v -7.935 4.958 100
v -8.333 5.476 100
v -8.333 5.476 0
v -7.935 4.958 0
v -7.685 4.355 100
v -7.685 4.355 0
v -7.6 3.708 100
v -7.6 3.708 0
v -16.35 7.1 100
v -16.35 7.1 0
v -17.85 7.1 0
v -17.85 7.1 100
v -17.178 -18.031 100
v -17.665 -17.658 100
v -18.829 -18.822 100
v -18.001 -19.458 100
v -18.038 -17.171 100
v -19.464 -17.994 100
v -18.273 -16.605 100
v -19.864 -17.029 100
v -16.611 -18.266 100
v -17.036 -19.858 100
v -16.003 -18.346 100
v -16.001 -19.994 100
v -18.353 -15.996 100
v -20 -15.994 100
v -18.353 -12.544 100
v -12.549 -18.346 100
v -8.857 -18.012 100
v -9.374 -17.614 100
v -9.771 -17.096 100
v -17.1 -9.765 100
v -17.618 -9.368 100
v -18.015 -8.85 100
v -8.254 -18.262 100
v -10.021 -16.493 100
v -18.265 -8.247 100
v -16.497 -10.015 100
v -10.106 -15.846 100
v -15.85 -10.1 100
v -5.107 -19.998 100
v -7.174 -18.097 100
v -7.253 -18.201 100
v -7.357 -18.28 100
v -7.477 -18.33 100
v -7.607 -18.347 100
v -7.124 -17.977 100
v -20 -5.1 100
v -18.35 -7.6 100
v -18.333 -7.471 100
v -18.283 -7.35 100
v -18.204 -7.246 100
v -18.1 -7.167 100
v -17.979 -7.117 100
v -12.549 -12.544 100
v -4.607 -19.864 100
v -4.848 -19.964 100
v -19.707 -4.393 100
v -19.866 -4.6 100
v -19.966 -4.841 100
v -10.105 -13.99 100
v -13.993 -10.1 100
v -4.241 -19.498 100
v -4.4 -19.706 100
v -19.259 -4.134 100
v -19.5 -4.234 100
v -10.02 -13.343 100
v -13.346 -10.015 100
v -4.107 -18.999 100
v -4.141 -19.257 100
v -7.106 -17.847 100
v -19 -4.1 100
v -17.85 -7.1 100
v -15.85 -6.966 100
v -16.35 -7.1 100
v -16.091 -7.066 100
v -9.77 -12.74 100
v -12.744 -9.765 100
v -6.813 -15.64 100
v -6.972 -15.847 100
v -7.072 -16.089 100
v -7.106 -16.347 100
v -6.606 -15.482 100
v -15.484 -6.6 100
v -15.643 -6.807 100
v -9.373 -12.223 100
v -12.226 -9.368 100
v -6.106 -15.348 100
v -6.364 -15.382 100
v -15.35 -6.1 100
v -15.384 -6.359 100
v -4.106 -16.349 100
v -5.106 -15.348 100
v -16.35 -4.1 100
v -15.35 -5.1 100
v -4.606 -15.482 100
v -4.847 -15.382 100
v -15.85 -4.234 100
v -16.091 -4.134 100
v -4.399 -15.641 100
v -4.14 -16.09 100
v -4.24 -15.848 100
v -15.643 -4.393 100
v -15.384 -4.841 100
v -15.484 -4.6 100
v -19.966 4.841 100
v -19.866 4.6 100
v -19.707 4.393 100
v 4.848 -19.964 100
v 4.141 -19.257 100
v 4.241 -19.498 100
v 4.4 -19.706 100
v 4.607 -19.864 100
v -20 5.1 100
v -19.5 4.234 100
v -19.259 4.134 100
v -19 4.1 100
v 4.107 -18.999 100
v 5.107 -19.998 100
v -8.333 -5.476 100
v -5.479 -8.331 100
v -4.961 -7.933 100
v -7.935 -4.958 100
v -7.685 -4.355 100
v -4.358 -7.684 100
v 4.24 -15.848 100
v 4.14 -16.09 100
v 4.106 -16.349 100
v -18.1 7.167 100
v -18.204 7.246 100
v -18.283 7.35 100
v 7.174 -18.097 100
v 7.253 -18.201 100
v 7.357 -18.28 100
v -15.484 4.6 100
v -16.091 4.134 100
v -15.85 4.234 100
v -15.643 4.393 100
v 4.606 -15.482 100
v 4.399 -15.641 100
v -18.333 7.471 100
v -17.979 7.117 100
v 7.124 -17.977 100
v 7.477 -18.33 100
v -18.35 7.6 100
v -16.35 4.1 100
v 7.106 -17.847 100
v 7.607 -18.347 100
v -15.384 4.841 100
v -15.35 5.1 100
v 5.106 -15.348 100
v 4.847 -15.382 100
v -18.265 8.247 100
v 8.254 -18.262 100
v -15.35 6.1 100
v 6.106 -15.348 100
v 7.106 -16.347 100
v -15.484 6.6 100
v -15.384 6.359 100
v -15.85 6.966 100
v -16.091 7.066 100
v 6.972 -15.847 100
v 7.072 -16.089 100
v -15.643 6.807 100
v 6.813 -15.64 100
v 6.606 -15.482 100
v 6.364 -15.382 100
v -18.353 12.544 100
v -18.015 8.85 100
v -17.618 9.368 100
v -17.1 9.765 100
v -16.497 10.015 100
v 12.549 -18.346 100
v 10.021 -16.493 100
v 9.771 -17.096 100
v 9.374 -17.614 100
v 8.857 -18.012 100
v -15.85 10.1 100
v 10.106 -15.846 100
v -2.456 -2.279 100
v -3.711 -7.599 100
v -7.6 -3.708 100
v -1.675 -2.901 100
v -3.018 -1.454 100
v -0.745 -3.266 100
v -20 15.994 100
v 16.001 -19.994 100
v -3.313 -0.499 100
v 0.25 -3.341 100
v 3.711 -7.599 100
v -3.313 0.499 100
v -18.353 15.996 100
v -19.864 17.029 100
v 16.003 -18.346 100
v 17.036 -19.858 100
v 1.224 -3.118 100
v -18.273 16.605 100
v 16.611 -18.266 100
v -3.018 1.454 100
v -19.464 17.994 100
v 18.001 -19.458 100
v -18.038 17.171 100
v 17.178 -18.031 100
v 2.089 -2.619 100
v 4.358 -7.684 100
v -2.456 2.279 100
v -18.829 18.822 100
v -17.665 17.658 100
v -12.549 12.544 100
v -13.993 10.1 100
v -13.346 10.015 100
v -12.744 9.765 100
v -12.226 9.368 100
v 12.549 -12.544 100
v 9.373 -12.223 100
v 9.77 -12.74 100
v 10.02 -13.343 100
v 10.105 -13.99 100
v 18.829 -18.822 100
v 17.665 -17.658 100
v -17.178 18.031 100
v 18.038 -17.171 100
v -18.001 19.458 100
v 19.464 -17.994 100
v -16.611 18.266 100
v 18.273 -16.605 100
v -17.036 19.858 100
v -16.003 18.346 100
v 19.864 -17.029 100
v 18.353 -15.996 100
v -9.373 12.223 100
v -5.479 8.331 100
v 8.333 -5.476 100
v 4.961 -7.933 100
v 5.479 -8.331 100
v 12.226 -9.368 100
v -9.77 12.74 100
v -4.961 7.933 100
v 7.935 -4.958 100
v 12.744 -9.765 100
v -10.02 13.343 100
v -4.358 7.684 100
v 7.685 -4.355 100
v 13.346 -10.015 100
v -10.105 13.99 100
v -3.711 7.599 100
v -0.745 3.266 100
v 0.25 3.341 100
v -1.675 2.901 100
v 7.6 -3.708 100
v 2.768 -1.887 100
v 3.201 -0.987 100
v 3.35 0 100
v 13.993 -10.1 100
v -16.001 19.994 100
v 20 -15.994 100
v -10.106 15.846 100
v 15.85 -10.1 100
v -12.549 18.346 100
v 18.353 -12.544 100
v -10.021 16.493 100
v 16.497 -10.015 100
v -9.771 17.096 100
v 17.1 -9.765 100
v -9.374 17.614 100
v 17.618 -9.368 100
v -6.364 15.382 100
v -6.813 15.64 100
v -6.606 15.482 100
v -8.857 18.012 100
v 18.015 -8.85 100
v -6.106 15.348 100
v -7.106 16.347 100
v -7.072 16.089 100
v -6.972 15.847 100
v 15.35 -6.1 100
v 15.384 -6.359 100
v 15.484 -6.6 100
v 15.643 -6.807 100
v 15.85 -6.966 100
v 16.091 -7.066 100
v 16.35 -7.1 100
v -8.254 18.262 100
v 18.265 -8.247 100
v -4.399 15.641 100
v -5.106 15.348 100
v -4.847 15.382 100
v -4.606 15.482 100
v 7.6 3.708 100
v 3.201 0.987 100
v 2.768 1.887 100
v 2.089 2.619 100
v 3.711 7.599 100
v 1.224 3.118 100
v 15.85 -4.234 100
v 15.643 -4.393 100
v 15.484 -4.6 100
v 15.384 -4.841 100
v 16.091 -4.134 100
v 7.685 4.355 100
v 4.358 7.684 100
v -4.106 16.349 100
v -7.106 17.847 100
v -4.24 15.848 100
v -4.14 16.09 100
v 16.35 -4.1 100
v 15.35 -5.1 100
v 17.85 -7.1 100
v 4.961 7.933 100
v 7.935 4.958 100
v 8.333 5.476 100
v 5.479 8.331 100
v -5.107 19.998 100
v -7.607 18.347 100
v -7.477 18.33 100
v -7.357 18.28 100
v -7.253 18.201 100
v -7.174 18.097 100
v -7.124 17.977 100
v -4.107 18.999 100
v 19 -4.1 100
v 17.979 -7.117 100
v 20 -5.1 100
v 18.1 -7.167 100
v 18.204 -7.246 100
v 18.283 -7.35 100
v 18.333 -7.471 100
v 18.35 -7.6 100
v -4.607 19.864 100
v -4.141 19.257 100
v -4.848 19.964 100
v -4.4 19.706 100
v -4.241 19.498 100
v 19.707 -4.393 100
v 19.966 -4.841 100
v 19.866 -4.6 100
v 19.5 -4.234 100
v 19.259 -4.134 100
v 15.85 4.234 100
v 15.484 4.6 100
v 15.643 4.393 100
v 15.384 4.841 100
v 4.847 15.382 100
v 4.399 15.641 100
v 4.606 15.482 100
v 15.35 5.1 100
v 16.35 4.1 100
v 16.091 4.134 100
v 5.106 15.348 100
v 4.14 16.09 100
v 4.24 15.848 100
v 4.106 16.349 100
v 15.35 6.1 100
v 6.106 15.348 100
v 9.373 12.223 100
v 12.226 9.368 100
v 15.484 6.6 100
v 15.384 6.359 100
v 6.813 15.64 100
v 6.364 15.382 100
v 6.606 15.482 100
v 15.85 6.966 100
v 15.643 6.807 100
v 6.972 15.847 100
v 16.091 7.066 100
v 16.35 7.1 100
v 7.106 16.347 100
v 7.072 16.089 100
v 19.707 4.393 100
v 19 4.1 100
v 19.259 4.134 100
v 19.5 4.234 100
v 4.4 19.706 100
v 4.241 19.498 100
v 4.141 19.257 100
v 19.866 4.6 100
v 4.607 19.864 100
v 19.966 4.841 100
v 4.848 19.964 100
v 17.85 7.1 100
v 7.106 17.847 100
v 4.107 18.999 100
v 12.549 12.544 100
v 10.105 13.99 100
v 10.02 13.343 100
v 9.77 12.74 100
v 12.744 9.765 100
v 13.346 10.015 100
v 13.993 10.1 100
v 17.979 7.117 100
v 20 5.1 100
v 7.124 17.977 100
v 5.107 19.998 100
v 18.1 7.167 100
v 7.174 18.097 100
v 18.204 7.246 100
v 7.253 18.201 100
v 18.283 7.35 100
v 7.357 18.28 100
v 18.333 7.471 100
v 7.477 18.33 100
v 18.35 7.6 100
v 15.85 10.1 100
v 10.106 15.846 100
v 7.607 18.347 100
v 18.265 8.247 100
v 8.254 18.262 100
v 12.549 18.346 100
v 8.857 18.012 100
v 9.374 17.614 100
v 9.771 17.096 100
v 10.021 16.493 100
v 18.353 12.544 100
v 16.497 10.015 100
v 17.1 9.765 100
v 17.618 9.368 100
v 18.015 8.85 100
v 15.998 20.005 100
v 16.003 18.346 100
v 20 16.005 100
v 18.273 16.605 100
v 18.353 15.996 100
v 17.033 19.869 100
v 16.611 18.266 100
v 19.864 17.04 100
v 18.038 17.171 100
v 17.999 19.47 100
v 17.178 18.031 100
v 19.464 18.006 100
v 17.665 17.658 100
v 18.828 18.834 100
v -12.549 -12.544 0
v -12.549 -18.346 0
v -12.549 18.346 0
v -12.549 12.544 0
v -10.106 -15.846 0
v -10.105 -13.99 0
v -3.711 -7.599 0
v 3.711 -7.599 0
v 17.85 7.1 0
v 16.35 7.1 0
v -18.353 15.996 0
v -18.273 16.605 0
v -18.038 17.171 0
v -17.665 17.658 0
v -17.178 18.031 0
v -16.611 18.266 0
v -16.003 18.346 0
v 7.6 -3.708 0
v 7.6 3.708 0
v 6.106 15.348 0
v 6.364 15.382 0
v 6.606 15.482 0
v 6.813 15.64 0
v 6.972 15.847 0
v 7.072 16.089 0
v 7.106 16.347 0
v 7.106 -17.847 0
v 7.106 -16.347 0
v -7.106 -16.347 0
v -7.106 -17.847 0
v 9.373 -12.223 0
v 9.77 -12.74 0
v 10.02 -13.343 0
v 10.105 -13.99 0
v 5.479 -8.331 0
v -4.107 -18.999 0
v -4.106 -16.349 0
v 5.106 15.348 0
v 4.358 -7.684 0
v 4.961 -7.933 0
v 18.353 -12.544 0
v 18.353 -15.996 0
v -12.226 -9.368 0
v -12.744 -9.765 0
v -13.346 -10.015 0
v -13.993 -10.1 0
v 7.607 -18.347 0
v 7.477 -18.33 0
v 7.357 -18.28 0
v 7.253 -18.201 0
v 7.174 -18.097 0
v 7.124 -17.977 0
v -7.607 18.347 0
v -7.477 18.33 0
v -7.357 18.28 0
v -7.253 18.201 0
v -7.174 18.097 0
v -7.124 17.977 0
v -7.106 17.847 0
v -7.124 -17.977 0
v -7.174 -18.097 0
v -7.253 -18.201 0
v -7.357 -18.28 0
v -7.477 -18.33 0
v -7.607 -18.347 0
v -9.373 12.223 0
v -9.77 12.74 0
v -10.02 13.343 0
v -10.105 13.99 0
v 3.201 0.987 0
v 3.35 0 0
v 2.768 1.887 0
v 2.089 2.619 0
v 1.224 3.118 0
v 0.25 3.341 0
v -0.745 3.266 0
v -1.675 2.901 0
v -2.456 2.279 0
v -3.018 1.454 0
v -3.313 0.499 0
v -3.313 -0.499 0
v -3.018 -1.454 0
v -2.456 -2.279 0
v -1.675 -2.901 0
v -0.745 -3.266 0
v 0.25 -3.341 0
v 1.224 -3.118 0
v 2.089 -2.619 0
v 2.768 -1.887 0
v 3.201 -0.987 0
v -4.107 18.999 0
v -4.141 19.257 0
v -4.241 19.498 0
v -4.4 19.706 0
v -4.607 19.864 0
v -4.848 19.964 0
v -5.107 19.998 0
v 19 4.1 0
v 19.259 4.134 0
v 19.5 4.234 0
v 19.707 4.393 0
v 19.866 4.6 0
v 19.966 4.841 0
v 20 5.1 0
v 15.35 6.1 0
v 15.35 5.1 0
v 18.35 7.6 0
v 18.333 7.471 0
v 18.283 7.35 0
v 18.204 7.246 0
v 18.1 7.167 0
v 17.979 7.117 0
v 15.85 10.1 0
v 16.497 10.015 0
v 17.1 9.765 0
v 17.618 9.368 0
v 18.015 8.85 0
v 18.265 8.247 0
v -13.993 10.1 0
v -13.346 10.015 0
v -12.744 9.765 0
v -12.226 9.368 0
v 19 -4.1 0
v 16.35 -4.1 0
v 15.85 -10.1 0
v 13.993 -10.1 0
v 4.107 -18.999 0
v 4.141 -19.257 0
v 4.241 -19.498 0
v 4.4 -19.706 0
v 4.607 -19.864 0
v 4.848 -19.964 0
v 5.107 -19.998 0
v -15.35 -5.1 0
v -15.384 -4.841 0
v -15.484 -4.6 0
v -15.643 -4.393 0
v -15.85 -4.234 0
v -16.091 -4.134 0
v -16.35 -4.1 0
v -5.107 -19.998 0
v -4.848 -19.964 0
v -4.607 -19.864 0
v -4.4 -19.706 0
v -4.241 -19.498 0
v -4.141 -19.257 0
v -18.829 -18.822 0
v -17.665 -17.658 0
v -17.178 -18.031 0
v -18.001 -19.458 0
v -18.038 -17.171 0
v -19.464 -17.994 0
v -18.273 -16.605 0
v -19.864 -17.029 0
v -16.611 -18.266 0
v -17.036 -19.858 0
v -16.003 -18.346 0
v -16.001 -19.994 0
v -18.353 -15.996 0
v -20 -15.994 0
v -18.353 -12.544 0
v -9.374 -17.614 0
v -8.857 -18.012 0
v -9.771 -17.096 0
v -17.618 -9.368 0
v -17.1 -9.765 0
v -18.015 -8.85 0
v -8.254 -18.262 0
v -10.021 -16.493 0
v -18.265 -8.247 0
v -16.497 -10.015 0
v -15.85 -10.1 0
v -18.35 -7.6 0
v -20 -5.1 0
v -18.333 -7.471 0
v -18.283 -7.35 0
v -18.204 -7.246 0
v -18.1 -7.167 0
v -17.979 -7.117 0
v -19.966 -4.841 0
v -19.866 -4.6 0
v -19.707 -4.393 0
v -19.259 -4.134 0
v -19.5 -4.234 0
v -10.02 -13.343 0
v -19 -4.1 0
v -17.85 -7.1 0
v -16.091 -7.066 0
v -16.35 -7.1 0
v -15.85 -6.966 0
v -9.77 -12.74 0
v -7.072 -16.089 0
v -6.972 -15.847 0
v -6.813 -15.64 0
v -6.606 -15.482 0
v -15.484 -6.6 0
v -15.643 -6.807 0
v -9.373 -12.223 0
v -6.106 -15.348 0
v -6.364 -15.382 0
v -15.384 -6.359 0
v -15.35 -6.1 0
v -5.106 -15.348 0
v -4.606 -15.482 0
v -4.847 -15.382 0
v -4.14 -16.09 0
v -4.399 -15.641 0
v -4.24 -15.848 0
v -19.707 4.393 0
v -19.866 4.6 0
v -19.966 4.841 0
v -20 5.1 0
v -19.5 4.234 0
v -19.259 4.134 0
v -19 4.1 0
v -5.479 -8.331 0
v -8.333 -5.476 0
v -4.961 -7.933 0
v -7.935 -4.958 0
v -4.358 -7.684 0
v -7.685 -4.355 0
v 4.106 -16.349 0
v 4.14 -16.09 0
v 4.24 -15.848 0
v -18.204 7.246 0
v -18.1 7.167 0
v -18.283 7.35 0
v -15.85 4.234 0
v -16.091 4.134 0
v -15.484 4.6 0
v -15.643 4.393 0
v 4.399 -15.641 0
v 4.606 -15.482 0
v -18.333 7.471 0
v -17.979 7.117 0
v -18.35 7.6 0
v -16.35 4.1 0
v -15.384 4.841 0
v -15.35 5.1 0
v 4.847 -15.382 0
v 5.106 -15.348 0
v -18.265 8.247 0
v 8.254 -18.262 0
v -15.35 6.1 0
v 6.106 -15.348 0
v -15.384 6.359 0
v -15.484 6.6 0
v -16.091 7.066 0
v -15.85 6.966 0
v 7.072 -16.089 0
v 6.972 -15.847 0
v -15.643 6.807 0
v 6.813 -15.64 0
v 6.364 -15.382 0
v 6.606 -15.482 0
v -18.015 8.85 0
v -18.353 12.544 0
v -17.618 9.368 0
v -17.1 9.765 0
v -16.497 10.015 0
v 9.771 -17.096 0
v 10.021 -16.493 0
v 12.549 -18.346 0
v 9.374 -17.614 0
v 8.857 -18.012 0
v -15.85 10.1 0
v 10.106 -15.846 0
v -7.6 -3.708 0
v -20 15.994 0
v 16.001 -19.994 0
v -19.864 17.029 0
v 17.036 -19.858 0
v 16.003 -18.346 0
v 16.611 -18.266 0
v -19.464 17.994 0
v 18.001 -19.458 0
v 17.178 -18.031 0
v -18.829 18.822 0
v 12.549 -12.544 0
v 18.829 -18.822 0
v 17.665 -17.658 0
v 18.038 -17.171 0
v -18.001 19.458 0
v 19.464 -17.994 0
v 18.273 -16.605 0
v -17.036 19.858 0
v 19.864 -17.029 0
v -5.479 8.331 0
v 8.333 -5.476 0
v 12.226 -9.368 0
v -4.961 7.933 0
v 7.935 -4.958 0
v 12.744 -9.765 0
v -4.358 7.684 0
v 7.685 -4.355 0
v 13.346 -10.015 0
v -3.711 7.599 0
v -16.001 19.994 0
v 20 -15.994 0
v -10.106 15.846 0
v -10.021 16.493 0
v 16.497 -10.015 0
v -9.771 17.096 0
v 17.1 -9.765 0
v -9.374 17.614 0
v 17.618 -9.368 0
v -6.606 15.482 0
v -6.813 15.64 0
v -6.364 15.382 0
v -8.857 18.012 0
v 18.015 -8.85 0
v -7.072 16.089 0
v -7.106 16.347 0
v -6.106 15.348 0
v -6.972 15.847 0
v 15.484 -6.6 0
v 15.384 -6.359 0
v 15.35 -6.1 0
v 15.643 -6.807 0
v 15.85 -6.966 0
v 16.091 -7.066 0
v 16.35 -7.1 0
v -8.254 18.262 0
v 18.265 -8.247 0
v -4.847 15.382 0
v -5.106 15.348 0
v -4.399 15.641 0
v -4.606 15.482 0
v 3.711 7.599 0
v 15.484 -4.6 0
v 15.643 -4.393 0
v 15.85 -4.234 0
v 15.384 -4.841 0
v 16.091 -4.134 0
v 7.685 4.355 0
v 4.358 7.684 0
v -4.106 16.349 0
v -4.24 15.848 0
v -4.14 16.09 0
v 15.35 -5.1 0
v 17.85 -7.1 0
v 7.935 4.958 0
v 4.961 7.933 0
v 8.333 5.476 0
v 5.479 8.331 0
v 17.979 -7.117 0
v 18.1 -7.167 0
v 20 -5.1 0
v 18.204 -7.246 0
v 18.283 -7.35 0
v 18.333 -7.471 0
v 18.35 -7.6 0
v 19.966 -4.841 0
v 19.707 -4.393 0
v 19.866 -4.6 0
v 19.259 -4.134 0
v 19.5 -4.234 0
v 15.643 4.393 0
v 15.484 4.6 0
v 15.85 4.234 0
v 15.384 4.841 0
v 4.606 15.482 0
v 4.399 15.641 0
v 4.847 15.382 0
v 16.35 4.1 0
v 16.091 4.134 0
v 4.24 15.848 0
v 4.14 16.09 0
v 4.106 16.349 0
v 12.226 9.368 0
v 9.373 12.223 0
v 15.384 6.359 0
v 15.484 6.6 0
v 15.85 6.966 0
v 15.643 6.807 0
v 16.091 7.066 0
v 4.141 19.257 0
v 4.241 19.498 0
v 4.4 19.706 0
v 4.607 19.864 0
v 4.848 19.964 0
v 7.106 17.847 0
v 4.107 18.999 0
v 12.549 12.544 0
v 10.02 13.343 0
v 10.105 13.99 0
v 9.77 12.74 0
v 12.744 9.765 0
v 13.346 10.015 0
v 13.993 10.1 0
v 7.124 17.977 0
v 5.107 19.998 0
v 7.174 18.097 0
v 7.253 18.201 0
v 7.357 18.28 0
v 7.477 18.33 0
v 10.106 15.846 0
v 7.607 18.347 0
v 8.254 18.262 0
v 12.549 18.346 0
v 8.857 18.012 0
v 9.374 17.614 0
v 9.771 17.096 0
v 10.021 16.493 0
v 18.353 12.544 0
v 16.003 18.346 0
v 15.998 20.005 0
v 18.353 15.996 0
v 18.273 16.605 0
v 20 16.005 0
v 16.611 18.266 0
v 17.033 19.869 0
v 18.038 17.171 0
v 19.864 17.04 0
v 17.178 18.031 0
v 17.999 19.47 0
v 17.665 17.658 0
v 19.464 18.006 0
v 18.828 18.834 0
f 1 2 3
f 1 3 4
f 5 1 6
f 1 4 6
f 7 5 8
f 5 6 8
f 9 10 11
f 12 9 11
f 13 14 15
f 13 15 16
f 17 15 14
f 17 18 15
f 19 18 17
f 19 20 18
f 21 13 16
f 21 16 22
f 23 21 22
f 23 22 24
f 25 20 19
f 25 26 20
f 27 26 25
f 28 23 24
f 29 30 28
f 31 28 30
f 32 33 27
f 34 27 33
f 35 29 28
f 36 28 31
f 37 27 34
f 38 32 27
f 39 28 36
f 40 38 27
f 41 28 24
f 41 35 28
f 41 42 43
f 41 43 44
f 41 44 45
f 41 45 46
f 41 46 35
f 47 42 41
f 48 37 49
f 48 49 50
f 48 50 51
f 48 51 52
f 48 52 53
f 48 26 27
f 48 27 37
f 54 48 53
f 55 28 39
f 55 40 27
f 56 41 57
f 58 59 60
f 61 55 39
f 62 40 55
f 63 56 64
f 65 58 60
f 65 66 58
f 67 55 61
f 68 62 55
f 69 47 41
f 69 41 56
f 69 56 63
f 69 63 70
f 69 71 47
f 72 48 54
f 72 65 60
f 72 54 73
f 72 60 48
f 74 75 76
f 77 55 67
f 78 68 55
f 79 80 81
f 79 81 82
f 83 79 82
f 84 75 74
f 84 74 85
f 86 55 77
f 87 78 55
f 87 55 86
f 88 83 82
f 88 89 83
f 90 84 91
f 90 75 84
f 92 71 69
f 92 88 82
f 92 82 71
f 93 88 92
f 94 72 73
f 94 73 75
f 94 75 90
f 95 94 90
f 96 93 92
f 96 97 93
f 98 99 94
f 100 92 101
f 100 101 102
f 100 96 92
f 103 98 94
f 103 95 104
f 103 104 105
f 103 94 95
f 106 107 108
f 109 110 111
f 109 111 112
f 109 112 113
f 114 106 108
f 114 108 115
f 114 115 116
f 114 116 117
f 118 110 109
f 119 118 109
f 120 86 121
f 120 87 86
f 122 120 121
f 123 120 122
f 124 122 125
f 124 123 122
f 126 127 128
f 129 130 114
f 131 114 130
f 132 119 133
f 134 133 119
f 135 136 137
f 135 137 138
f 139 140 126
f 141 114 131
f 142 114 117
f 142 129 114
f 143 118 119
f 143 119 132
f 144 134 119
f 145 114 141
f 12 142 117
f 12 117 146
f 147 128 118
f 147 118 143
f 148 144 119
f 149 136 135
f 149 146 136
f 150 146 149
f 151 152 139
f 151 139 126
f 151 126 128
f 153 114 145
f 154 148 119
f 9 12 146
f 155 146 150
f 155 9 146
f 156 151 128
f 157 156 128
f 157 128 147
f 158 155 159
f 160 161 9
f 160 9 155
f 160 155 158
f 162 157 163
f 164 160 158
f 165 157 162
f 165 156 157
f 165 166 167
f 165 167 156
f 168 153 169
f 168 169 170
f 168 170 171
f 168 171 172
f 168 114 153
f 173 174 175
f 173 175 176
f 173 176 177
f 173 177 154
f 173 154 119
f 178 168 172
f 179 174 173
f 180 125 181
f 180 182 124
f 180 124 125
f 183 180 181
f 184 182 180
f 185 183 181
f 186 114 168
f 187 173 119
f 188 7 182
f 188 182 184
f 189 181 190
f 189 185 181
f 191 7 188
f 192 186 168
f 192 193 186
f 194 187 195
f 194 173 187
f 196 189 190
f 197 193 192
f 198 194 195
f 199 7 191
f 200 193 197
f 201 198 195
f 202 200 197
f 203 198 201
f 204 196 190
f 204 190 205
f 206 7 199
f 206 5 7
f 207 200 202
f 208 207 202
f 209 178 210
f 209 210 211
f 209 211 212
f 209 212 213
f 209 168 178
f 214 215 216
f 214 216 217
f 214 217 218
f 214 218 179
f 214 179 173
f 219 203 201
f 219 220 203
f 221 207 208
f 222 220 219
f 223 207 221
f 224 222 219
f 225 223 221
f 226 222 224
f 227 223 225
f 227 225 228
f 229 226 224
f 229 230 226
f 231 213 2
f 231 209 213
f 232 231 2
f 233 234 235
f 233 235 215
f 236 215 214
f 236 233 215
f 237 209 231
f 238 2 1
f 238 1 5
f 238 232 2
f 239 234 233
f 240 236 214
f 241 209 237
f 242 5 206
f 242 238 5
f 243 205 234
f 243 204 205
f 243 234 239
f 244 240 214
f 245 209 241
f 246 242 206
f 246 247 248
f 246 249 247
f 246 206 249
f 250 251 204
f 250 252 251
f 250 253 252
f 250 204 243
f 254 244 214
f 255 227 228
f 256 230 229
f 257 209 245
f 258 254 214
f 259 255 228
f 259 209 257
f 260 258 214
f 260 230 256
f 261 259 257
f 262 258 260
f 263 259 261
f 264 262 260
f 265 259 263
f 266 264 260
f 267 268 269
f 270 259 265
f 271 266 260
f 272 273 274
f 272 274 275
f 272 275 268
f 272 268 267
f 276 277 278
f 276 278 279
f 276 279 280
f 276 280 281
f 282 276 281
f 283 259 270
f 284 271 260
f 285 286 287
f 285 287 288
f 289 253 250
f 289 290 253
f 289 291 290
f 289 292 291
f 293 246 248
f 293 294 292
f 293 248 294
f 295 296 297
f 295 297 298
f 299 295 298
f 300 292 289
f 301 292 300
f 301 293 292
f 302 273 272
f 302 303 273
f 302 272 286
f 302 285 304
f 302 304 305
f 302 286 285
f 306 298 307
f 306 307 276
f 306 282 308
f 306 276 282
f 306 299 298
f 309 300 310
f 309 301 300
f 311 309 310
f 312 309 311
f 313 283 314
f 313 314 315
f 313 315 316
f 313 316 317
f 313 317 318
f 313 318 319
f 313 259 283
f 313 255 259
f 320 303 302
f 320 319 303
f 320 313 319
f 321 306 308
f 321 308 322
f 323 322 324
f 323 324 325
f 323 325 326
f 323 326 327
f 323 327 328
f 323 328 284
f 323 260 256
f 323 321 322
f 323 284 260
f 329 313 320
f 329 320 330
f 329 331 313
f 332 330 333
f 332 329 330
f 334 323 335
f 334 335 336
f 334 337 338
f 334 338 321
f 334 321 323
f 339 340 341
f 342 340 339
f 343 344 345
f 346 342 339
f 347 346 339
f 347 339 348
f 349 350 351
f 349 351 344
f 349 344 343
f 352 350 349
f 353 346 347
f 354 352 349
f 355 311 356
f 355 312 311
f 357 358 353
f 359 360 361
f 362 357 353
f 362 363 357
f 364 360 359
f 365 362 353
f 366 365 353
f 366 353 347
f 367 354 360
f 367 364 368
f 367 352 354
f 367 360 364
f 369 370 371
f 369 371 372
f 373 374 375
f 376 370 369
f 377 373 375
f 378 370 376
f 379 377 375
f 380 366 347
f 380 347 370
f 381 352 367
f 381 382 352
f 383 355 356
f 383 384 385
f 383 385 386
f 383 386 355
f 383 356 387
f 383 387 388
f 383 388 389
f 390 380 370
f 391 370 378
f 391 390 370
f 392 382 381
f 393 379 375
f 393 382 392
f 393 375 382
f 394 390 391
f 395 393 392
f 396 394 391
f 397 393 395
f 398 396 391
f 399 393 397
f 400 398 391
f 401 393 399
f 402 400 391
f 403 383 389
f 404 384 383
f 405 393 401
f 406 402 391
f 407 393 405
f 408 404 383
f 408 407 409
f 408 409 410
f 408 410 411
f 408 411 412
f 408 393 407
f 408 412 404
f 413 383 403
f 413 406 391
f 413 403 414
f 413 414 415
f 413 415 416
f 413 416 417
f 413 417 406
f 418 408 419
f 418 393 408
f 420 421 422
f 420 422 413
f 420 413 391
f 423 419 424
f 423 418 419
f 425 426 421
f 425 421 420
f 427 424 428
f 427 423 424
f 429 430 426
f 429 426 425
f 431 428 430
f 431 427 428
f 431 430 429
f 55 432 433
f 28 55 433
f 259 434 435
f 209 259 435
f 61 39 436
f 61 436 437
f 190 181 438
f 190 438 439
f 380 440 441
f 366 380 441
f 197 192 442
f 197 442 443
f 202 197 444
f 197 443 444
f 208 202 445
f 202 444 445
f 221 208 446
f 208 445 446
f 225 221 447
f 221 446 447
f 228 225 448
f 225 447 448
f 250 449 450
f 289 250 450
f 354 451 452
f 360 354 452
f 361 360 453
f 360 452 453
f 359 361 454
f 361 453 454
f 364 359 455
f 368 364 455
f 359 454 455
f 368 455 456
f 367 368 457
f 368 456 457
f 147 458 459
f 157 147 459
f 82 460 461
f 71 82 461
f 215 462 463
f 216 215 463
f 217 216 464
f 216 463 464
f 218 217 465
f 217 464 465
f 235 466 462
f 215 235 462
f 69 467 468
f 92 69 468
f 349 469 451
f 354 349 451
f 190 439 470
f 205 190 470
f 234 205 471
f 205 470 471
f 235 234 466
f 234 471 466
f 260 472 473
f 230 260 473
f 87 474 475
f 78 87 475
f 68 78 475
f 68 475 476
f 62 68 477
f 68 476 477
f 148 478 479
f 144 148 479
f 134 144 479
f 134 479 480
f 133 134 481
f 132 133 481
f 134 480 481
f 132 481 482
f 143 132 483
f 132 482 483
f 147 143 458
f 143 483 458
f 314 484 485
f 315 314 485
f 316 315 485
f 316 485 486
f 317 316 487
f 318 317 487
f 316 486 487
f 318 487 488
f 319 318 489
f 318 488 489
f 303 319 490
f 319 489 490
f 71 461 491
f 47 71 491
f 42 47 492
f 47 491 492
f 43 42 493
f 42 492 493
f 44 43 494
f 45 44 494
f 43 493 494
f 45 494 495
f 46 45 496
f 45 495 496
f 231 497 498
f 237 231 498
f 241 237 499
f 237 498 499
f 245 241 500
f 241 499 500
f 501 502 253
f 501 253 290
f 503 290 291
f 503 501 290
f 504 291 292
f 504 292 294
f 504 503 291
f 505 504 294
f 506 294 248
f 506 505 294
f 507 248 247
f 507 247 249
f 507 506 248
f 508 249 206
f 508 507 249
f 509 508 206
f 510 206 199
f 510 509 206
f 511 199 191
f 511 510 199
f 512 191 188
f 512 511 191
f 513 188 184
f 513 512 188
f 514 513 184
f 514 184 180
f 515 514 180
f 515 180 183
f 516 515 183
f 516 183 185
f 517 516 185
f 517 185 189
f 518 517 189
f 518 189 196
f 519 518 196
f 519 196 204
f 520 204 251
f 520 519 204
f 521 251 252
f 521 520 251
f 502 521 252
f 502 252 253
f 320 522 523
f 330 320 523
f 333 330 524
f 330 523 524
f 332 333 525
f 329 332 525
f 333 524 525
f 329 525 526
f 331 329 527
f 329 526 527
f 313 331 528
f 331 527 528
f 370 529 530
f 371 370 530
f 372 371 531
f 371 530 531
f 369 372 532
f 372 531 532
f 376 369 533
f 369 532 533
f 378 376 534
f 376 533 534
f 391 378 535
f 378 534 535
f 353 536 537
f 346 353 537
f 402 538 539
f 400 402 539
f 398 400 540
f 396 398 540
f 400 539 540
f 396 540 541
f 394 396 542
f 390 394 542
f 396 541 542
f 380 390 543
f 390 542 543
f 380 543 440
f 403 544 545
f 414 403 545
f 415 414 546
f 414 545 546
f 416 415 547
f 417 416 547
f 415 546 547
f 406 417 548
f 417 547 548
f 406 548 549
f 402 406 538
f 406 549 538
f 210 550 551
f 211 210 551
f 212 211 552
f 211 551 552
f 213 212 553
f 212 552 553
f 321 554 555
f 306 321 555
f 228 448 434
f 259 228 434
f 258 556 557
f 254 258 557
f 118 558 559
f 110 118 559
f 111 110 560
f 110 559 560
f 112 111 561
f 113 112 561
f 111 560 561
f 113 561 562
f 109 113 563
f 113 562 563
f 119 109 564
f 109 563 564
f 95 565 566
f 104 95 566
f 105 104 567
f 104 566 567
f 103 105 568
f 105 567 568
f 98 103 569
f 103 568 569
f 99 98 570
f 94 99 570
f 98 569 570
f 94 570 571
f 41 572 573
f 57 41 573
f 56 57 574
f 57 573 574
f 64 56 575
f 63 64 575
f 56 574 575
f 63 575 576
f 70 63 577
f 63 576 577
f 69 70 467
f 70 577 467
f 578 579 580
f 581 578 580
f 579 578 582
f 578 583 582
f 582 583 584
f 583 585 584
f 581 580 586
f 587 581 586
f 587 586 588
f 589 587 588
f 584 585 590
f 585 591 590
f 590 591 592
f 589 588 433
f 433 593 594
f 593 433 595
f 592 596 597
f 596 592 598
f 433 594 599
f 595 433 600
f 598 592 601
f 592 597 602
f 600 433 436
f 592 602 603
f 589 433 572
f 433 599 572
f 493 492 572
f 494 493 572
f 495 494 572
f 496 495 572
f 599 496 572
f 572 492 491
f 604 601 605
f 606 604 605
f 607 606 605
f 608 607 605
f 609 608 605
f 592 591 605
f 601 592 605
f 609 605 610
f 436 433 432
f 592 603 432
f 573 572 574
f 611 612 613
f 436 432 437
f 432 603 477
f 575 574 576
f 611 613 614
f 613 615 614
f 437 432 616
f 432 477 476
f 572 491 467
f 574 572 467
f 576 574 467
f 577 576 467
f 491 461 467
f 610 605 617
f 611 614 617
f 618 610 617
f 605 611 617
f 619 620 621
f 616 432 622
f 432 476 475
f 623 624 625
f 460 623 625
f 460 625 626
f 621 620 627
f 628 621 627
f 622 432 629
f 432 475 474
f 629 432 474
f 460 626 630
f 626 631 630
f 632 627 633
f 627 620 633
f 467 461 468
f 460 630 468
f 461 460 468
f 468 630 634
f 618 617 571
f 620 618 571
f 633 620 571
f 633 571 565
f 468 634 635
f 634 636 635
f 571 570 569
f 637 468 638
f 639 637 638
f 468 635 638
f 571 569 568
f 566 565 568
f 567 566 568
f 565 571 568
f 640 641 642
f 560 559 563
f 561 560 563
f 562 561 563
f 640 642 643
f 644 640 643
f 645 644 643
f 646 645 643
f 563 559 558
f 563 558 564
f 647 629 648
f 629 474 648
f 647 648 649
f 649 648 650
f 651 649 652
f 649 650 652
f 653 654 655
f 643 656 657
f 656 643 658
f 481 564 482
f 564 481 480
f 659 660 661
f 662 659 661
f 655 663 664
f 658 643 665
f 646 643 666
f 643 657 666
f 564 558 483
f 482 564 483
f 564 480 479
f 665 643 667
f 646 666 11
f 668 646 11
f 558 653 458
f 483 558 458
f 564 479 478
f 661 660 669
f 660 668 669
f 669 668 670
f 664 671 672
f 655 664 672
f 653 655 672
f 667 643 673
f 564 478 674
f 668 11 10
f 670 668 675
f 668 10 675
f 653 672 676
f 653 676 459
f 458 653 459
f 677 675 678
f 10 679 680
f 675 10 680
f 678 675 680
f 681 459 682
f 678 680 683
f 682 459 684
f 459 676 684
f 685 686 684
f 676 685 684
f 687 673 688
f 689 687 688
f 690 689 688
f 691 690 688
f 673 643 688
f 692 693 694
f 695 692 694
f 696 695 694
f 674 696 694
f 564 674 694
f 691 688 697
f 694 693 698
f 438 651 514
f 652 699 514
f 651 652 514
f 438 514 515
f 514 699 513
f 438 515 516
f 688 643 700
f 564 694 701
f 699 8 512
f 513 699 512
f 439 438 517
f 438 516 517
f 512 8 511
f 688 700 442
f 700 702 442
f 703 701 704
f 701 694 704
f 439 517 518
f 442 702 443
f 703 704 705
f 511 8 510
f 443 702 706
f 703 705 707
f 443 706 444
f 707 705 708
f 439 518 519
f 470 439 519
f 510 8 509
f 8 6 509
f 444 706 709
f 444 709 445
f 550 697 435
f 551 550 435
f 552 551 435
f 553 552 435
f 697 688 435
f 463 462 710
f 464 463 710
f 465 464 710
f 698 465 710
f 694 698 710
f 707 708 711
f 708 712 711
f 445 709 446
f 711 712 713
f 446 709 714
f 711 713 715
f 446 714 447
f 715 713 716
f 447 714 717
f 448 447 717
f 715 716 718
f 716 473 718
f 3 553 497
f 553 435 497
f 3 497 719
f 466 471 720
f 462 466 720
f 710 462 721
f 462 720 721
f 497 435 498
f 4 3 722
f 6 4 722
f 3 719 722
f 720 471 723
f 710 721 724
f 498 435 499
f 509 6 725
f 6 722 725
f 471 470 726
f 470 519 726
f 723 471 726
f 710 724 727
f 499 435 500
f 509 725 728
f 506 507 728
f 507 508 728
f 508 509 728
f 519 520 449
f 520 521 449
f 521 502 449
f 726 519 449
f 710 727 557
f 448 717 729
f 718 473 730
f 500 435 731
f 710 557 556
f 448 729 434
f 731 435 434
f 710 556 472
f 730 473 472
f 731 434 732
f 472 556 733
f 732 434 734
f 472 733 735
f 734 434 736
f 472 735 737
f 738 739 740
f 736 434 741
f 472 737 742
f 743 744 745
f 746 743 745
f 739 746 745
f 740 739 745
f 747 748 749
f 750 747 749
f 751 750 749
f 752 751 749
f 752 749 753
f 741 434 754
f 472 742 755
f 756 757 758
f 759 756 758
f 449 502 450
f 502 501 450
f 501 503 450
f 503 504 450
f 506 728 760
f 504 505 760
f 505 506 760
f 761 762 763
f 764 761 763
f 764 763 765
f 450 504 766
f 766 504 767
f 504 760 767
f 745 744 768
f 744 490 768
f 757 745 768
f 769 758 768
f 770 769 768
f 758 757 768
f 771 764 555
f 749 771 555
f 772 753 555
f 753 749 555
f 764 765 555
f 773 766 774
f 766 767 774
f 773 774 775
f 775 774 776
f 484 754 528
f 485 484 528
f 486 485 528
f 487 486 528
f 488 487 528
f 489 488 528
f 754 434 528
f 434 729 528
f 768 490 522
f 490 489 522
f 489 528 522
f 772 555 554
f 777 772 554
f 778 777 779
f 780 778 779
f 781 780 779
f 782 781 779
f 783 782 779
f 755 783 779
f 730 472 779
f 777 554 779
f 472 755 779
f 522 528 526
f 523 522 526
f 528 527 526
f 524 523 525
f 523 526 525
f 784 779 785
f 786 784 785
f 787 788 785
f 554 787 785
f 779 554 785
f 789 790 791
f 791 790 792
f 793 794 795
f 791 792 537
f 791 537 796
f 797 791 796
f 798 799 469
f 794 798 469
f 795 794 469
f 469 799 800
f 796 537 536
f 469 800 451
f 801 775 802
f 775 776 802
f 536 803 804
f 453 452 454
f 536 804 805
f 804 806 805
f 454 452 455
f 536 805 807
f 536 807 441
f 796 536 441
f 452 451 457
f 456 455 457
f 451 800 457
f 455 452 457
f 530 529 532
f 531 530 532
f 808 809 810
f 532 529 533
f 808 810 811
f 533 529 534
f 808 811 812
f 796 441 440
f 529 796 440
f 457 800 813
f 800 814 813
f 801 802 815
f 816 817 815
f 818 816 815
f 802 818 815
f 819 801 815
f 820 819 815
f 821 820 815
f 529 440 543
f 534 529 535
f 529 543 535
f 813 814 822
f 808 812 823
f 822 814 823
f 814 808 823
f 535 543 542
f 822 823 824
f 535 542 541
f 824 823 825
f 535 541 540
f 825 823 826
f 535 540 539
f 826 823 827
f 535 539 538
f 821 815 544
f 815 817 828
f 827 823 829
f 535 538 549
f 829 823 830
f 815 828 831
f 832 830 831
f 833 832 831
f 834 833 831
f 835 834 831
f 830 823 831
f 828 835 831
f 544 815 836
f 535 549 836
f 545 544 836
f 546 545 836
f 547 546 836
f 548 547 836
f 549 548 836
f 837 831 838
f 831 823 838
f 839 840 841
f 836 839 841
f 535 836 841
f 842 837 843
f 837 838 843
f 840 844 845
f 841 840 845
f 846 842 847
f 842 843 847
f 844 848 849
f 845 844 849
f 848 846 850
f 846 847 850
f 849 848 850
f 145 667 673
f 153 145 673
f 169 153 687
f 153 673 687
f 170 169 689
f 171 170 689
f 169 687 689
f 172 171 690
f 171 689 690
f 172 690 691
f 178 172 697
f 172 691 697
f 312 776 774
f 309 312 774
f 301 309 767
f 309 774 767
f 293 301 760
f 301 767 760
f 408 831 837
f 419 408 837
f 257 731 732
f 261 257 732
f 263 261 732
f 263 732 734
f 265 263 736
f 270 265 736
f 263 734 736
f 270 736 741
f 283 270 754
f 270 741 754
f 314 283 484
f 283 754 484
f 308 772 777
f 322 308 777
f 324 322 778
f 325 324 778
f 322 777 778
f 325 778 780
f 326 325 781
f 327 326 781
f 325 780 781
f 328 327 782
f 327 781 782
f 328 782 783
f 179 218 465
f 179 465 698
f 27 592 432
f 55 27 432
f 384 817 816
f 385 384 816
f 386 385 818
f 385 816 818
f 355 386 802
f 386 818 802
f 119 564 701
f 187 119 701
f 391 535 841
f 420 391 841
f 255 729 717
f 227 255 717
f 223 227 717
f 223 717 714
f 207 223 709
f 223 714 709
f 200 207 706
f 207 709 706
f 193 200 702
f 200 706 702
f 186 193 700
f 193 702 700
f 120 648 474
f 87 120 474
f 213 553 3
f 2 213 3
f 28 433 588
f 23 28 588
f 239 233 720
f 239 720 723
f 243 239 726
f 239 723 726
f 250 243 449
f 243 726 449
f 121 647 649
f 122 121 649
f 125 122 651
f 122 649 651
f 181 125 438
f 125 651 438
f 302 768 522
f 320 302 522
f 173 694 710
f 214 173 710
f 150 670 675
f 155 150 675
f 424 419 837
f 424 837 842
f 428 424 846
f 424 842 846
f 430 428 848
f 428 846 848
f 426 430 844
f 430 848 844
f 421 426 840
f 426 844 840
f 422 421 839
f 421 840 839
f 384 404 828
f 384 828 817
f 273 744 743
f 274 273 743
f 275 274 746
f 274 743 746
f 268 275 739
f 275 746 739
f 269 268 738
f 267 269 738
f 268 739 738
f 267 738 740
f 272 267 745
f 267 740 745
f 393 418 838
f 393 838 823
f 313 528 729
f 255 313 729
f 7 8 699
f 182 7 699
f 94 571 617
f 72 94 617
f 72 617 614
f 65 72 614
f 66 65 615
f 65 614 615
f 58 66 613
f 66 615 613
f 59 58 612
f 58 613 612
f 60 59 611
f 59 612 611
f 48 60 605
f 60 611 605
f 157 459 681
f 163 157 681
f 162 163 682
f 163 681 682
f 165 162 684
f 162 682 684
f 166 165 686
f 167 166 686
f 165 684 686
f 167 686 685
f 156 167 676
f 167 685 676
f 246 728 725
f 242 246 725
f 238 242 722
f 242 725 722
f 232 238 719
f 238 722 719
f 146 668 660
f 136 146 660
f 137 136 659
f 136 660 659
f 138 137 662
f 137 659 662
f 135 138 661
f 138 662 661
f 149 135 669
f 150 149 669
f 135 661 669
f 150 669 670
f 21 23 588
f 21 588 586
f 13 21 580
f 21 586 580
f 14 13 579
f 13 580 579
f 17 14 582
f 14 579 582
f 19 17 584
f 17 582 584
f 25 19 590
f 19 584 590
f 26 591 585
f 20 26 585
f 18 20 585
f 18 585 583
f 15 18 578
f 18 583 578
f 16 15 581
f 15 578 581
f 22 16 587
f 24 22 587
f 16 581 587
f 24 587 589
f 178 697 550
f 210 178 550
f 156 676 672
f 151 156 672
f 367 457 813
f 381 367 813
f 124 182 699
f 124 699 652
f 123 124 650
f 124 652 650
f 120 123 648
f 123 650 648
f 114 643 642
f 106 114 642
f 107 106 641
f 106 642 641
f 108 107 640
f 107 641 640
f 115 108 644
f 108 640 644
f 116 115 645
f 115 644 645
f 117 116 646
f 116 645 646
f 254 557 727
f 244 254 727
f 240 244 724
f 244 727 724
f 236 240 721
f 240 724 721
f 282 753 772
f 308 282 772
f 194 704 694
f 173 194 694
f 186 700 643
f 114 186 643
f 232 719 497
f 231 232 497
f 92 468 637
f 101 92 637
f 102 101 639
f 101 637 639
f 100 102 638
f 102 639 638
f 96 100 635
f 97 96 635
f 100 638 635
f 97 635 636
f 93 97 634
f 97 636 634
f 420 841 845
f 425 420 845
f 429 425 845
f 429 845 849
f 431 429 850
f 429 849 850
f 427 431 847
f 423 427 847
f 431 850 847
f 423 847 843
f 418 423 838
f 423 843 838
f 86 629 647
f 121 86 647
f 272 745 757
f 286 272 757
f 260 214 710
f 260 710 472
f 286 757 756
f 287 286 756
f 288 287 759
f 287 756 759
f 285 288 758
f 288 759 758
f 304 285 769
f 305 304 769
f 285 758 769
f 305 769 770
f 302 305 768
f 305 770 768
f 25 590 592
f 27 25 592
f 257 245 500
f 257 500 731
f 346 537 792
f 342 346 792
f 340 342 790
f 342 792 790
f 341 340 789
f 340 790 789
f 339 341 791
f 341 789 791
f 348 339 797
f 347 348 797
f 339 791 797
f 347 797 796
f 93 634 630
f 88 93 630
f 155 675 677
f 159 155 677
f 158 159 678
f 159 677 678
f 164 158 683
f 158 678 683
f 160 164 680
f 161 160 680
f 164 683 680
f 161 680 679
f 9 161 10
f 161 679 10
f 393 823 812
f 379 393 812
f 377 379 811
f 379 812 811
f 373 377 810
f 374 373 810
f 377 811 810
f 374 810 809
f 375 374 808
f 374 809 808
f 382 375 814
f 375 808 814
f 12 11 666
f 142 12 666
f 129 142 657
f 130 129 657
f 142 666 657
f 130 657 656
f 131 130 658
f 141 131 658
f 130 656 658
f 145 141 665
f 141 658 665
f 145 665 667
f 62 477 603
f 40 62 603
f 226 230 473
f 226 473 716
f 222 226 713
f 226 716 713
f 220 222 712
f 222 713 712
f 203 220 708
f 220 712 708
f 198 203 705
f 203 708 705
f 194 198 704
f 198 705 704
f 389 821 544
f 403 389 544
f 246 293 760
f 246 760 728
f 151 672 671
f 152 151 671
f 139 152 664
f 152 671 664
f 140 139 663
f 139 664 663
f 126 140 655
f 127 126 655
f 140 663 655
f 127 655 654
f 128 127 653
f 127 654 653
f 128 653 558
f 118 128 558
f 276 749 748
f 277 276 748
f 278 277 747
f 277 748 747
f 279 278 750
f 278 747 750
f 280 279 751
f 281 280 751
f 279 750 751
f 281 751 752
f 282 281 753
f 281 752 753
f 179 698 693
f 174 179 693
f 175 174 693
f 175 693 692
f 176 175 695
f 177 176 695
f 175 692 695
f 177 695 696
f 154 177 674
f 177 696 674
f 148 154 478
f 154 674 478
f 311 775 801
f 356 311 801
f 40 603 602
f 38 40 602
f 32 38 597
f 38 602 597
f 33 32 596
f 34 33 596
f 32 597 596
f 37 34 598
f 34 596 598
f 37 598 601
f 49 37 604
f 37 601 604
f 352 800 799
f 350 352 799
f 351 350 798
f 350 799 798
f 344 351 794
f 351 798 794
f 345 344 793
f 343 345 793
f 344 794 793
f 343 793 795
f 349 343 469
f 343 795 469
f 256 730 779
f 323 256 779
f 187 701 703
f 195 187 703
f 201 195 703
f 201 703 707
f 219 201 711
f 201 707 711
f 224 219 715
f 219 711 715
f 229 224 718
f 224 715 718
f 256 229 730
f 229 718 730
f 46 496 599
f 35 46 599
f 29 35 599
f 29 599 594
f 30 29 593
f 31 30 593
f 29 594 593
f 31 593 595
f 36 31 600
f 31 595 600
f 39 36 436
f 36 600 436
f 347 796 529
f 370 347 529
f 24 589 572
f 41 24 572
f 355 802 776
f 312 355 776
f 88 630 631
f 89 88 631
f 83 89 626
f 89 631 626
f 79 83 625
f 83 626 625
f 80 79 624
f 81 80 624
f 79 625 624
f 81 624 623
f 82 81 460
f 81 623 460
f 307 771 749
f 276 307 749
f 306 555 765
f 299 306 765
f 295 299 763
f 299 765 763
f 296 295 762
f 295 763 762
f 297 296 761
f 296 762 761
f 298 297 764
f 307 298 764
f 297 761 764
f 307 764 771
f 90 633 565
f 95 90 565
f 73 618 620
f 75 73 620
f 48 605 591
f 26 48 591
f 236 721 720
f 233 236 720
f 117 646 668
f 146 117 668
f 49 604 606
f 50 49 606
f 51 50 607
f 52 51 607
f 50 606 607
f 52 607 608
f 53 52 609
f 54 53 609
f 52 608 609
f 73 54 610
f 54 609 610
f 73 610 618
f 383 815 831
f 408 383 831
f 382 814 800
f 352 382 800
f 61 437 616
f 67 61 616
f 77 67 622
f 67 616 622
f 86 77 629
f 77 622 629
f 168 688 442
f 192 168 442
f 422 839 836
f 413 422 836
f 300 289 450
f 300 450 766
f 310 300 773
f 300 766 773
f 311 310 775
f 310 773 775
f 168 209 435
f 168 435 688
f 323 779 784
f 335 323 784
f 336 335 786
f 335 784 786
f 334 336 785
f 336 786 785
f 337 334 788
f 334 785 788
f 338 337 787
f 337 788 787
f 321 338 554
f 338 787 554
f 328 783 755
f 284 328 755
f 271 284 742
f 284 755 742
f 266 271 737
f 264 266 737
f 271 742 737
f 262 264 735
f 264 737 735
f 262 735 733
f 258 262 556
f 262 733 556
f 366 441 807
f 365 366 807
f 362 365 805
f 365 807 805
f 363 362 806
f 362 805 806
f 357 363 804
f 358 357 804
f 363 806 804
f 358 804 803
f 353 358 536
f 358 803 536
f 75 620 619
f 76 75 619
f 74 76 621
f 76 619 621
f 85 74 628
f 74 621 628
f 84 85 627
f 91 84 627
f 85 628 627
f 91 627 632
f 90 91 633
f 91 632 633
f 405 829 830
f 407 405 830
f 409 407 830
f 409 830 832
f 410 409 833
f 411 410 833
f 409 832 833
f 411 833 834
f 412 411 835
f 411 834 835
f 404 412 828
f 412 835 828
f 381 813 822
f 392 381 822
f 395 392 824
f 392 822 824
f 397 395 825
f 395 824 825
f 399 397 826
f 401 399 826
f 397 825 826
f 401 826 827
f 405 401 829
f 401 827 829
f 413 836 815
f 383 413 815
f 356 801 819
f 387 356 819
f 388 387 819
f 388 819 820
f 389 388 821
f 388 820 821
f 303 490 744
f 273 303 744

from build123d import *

# Parameters (mm, degrees)
F0_R     = 3.35
F1_DEPTH = 100


with BuildPart() as f1:
    # F0 (on Top) → F1 (new body)
    with BuildSketch(Plane.XY):
        with BuildLine():
            Line((20, -15.994185), (20, -5.1))
            ThreePointArc((20, -5.1), (19.707107, -4.392893), (19, -4.1))
            Line((19, -4.1), (16.35, -4.1))
            ThreePointArc((16.35, -4.1), (15.642893, -4.392893), (15.35, -5.1))
            Line((15.35, -5.1), (15.35, -6.1))
            ThreePointArc((15.35, -6.1), (15.642893, -6.807107), (16.35, -7.1))
            Line((16.35, -7.1), (17.85, -7.1))
            ThreePointArc((17.85, -7.1), (18.203553, -7.246447), (18.35, -7.6))
            ThreePointArc((18.35, -7.6), (17.617767, -9.367767), (15.85, -10.1))
            Line((15.85, -10.1), (13.993362, -10.1))
            ThreePointArc((13.993362, -10.1), (13.036864, -9.909786), (12.225917, -9.368088))
            Line((12.225917, -9.368088), (8.332554, -5.476141))
            ThreePointArc((8.332554, -5.476141), (7.790388, -4.664971), (7.6, -3.708053))
            Line((7.6, -3.708053), (7.6, 3.708053))
            ThreePointArc((7.6, 3.708053), (7.790388, 4.664971), (8.332554, 5.476141))
            Line((8.332554, 5.476141), (12.225917, 9.368088))
            ThreePointArc((12.225917, 9.368088), (13.036864, 9.909786), (13.993362, 10.1))
            Line((13.993362, 10.1), (15.85, 10.1))
            ThreePointArc((15.85, 10.1), (17.617767, 9.367767), (18.35, 7.6))
            ThreePointArc((18.35, 7.6), (18.203553, 7.246447), (17.85, 7.1))
            Line((17.85, 7.1), (16.35, 7.1))
            ThreePointArc((16.35, 7.1), (15.642893, 6.807107), (15.35, 6.1))
            Line((15.35, 6.1), (15.35, 5.1))
            ThreePointArc((15.35, 5.1), (15.642893, 4.392893), (16.35, 4.1))
            Line((16.35, 4.1), (19, 4.1))
            ThreePointArc((19, 4.1), (19.707107, 4.392893), (20, 5.1))
            Line((20, 5.1), (20, 16.004817))
            ThreePointArc((20, 16.004817), (18.827561, 18.834111), (15.997549, 20.004817))
            Line((15.997549, 20.004817), (5.10727, 19.998145))
            ThreePointArc((5.10727, 19.998145), (4.400057, 19.705509), (4.106906, 18.998508))
            Line((4.106906, 18.998508), (4.105943, 16.348509))
            ThreePointArc((4.105943, 16.348509), (4.398579, 15.641295), (5.105579, 15.348145))
            Line((5.105579, 15.348145), (6.105579, 15.347782))
            ThreePointArc((6.105579, 15.347782), (6.812793, 15.640418), (7.105943, 16.347418))
            Line((7.105943, 16.347418), (7.106488, 17.847418))
            ThreePointArc((7.106488, 17.847418), (7.253063, 18.200918), (7.60667, 18.347236))
            ThreePointArc((7.60667, 18.347236), (9.374171, 17.614361), (10.105761, 15.846328))
            Line((10.105761, 15.846328), (10.105086, 13.98969))
            ThreePointArc((10.105086, 13.98969), (9.914524, 13.03326), (9.372532, 12.222511))
            Line((9.372532, 12.222511), (5.479169, 8.330563))
            ThreePointArc((5.479169, 8.330563), (4.667803, 7.788692), (3.710815, 7.598652))
            Line((3.710815, 7.598652), (-3.710815, 7.598652))
            ThreePointArc((-3.710815, 7.598652), (-4.667803, 7.788692), (-5.479169, 8.330563))
            Line((-5.479169, 8.330563), (-9.372532, 12.222511))
            ThreePointArc((-9.372532, 12.222511), (-9.914524, 13.03326), (-10.105086, 13.98969))
            Line((-10.105086, 13.98969), (-10.105761, 15.846328))
            ThreePointArc((-10.105761, 15.846328), (-9.374171, 17.614361), (-7.60667, 18.347236))
            ThreePointArc((-7.60667, 18.347236), (-7.253063, 18.200918), (-7.106488, 17.847418))
            Line((-7.106488, 17.847418), (-7.105943, 16.347418))
            ThreePointArc((-7.105943, 16.347418), (-6.812793, 15.640418), (-6.105579, 15.347782))
            Line((-6.105579, 15.347782), (-5.105579, 15.348145))
            ThreePointArc((-5.105579, 15.348145), (-4.398579, 15.641295), (-4.105943, 16.348509))
            Line((-4.105943, 16.348509), (-4.106906, 18.998508))
            ThreePointArc((-4.106906, 18.998508), (-4.400057, 19.705509), (-5.10727, 19.998145))
            Line((-5.10727, 19.998145), (-16.001454, 19.994185))
            ThreePointArc((-16.001454, 19.994185), (-18.828941, 18.822098), (-20, 15.994185))
            Line((-20, 15.994185), (-20, 5.1))
            ThreePointArc((-20, 5.1), (-19.707107, 4.392893), (-19, 4.1))
            Line((-19, 4.1), (-16.35, 4.1))
            ThreePointArc((-16.35, 4.1), (-15.642893, 4.392893), (-15.35, 5.1))
            Line((-15.35, 5.1), (-15.35, 6.1))
            ThreePointArc((-15.35, 6.1), (-15.642893, 6.807107), (-16.35, 7.1))
            Line((-16.35, 7.1), (-17.85, 7.1))
            ThreePointArc((-17.85, 7.1), (-18.203553, 7.246447), (-18.35, 7.6))
            ThreePointArc((-18.35, 7.6), (-17.617767, 9.367767), (-15.85, 10.1))
            Line((-15.85, 10.1), (-13.993362, 10.1))
            ThreePointArc((-13.993362, 10.1), (-13.036864, 9.909786), (-12.225917, 9.368088))
            Line((-12.225917, 9.368088), (-8.332554, 5.476141))
            ThreePointArc((-8.332554, 5.476141), (-7.790388, 4.664971), (-7.6, 3.708053))
            Line((-7.6, 3.708053), (-7.6, -3.708053))
            ThreePointArc((-7.6, -3.708053), (-7.790388, -4.664971), (-8.332554, -5.476141))
            Line((-8.332554, -5.476141), (-12.225917, -9.368088))
            ThreePointArc((-12.225917, -9.368088), (-13.036864, -9.909786), (-13.993362, -10.1))
            Line((-13.993362, -10.1), (-15.85, -10.1))
            ThreePointArc((-15.85, -10.1), (-17.617767, -9.367767), (-18.35, -7.6))
            ThreePointArc((-18.35, -7.6), (-18.203553, -7.246447), (-17.85, -7.1))
            Line((-17.85, -7.1), (-16.35, -7.1))
            ThreePointArc((-16.35, -7.1), (-15.642893, -6.807107), (-15.35, -6.1))
            Line((-15.35, -6.1), (-15.35, -5.1))
            ThreePointArc((-15.35, -5.1), (-15.642893, -4.392893), (-16.35, -4.1))
            Line((-16.35, -4.1), (-19, -4.1))
            ThreePointArc((-19, -4.1), (-19.707107, -4.392893), (-20, -5.1))
            Line((-20, -5.1), (-20, -15.994185))
            ThreePointArc((-20, -15.994185), (-18.828941, -18.822098), (-16.001454, -19.994185))
            Line((-16.001454, -19.994185), (-5.10727, -19.998145))
            ThreePointArc((-5.10727, -19.998145), (-4.400057, -19.705509), (-4.106906, -18.998508))
            Line((-4.106906, -18.998508), (-4.105943, -16.348509))
            ThreePointArc((-4.105943, -16.348509), (-4.398579, -15.641295), (-5.105579, -15.348145))
            Line((-5.105579, -15.348145), (-6.105579, -15.347782))
            ThreePointArc((-6.105579, -15.347782), (-6.812793, -15.640418), (-7.105943, -16.347418))
            Line((-7.105943, -16.347418), (-7.106488, -17.847418))
            ThreePointArc((-7.106488, -17.847418), (-7.253063, -18.200918), (-7.60667, -18.347236))
            ThreePointArc((-7.60667, -18.347236), (-9.374171, -17.614361), (-10.105761, -15.846328))
            Line((-10.105761, -15.846328), (-10.105086, -13.98969))
            ThreePointArc((-10.105086, -13.98969), (-9.914524, -13.03326), (-9.372532, -12.222511))
            Line((-9.372532, -12.222511), (-5.479169, -8.330563))
            ThreePointArc((-5.479169, -8.330563), (-4.667803, -7.788692), (-3.710815, -7.598652))
            Line((-3.710815, -7.598652), (3.710815, -7.598652))
            ThreePointArc((3.710815, -7.598652), (4.667803, -7.788692), (5.479169, -8.330563))
            Line((5.479169, -8.330563), (9.372532, -12.222511))
            ThreePointArc((9.372532, -12.222511), (9.914524, -13.03326), (10.105086, -13.98969))
            Line((10.105086, -13.98969), (10.105761, -15.846328))
            ThreePointArc((10.105761, -15.846328), (9.374171, -17.614361), (7.60667, -18.347236))
            ThreePointArc((7.60667, -18.347236), (7.253063, -18.200918), (7.106488, -17.847418))
            Line((7.106488, -17.847418), (7.105943, -16.347418))
            ThreePointArc((7.105943, -16.347418), (6.812793, -15.640418), (6.105579, -15.347782))
            Line((6.105579, -15.347782), (5.105579, -15.348145))
            ThreePointArc((5.105579, -15.348145), (4.398579, -15.641295), (4.105943, -16.348509))
            Line((4.105943, -16.348509), (4.106906, -18.998508))
            ThreePointArc((4.106906, -18.998508), (4.400057, -19.705509), (5.10727, -19.998145))
            Line((5.10727, -19.998145), (16.001454, -19.994185))
            ThreePointArc((16.001454, -19.994185), (18.828941, -18.822098), (20, -15.994185))
        make_face()
        with BuildLine():
            ThreePointArc((-16.002998, -18.346327), (-17.664699, -17.658028), (-18.352998, -15.996327))
            Line((-18.352998, -15.996327), (-18.352998, -12.544276))
            Line((-18.352998, -12.544276), (-12.548836, -12.544276))
            Line((-12.548836, -12.544276), (-12.548836, -18.346327))
            Line((-12.548836, -18.346327), (-16.002998, -18.346327))
        make_face(mode=Mode.SUBTRACT)
        with BuildLine():
            ThreePointArc((18.352998, -15.996327), (17.664699, -17.658028), (16.002998, -18.346327))
            Line((16.002998, -18.346327), (12.548836, -18.346327))
            Line((12.548836, -18.346327), (12.548836, -12.544276))
            Line((12.548836, -12.544276), (18.352998, -12.544276))
            Line((18.352998, -12.544276), (18.352998, -15.996327))
        make_face(mode=Mode.SUBTRACT)
        Circle(F0_R, mode=Mode.SUBTRACT)
        with BuildLine():
            Line((-16.002998, 18.346327), (-12.548836, 18.346327))
            Line((-12.548836, 18.346327), (-12.548836, 12.544276))
            Line((-12.548836, 12.544276), (-18.352998, 12.544276))
            Line((-18.352998, 12.544276), (-18.352998, 15.996327))
            ThreePointArc((-18.352998, 15.996327), (-17.664699, 17.658028), (-16.002998, 18.346327))
        make_face(mode=Mode.SUBTRACT)
        with BuildLine():
            Line((12.548836, 18.346327), (16.002998, 18.346327))
            ThreePointArc((16.002998, 18.346327), (17.664699, 17.658028), (18.352998, 15.996327))
            Line((18.352998, 15.996327), (18.352998, 12.544276))
            Line((18.352998, 12.544276), (12.548836, 12.544276))
            Line((12.548836, 12.544276), (12.548836, 18.346327))
        make_face(mode=Mode.SUBTRACT)
    extrude(amount=F1_DEPTH)


solid = f1.part
